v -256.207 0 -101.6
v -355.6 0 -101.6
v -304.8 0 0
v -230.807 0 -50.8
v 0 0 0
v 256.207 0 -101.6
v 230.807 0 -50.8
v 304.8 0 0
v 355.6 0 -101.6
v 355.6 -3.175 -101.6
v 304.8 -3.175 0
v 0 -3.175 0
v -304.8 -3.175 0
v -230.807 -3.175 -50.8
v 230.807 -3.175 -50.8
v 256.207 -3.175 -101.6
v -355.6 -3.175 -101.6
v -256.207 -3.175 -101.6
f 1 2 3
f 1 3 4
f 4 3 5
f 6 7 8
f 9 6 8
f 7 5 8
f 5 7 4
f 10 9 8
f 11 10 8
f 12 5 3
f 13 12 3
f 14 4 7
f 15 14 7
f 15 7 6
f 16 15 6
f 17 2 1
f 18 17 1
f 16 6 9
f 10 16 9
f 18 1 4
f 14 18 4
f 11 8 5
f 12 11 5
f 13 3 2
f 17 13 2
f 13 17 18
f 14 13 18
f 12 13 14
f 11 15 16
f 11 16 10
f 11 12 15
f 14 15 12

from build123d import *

# Parameters (mm, degrees)
F1_DEPTH = 3.175


# Not quite as in the source:
# - ends of sketch curves that miss each other by under 0.0002 mm in the source are joined


with BuildPart() as f1:
    # F0 (on Front) → F1 (new body)
    with BuildSketch(Plane.XZ):
        Polygon((0, -50.8), (0, 0), (-304.8, -6.031e-07), (-355.6, -101.6), (-256.2067782821, -101.6), (-230.8067781314, -50.8), align=None)
        Polygon((304.8, 0), (0, -3.015e-07), (0, -50.8), (230.8067784001, -50.8), (256.2067784001, -101.6), (355.6, -101.6), align=None)
    extrude(amount=F1_DEPTH)


solid = f1.part
